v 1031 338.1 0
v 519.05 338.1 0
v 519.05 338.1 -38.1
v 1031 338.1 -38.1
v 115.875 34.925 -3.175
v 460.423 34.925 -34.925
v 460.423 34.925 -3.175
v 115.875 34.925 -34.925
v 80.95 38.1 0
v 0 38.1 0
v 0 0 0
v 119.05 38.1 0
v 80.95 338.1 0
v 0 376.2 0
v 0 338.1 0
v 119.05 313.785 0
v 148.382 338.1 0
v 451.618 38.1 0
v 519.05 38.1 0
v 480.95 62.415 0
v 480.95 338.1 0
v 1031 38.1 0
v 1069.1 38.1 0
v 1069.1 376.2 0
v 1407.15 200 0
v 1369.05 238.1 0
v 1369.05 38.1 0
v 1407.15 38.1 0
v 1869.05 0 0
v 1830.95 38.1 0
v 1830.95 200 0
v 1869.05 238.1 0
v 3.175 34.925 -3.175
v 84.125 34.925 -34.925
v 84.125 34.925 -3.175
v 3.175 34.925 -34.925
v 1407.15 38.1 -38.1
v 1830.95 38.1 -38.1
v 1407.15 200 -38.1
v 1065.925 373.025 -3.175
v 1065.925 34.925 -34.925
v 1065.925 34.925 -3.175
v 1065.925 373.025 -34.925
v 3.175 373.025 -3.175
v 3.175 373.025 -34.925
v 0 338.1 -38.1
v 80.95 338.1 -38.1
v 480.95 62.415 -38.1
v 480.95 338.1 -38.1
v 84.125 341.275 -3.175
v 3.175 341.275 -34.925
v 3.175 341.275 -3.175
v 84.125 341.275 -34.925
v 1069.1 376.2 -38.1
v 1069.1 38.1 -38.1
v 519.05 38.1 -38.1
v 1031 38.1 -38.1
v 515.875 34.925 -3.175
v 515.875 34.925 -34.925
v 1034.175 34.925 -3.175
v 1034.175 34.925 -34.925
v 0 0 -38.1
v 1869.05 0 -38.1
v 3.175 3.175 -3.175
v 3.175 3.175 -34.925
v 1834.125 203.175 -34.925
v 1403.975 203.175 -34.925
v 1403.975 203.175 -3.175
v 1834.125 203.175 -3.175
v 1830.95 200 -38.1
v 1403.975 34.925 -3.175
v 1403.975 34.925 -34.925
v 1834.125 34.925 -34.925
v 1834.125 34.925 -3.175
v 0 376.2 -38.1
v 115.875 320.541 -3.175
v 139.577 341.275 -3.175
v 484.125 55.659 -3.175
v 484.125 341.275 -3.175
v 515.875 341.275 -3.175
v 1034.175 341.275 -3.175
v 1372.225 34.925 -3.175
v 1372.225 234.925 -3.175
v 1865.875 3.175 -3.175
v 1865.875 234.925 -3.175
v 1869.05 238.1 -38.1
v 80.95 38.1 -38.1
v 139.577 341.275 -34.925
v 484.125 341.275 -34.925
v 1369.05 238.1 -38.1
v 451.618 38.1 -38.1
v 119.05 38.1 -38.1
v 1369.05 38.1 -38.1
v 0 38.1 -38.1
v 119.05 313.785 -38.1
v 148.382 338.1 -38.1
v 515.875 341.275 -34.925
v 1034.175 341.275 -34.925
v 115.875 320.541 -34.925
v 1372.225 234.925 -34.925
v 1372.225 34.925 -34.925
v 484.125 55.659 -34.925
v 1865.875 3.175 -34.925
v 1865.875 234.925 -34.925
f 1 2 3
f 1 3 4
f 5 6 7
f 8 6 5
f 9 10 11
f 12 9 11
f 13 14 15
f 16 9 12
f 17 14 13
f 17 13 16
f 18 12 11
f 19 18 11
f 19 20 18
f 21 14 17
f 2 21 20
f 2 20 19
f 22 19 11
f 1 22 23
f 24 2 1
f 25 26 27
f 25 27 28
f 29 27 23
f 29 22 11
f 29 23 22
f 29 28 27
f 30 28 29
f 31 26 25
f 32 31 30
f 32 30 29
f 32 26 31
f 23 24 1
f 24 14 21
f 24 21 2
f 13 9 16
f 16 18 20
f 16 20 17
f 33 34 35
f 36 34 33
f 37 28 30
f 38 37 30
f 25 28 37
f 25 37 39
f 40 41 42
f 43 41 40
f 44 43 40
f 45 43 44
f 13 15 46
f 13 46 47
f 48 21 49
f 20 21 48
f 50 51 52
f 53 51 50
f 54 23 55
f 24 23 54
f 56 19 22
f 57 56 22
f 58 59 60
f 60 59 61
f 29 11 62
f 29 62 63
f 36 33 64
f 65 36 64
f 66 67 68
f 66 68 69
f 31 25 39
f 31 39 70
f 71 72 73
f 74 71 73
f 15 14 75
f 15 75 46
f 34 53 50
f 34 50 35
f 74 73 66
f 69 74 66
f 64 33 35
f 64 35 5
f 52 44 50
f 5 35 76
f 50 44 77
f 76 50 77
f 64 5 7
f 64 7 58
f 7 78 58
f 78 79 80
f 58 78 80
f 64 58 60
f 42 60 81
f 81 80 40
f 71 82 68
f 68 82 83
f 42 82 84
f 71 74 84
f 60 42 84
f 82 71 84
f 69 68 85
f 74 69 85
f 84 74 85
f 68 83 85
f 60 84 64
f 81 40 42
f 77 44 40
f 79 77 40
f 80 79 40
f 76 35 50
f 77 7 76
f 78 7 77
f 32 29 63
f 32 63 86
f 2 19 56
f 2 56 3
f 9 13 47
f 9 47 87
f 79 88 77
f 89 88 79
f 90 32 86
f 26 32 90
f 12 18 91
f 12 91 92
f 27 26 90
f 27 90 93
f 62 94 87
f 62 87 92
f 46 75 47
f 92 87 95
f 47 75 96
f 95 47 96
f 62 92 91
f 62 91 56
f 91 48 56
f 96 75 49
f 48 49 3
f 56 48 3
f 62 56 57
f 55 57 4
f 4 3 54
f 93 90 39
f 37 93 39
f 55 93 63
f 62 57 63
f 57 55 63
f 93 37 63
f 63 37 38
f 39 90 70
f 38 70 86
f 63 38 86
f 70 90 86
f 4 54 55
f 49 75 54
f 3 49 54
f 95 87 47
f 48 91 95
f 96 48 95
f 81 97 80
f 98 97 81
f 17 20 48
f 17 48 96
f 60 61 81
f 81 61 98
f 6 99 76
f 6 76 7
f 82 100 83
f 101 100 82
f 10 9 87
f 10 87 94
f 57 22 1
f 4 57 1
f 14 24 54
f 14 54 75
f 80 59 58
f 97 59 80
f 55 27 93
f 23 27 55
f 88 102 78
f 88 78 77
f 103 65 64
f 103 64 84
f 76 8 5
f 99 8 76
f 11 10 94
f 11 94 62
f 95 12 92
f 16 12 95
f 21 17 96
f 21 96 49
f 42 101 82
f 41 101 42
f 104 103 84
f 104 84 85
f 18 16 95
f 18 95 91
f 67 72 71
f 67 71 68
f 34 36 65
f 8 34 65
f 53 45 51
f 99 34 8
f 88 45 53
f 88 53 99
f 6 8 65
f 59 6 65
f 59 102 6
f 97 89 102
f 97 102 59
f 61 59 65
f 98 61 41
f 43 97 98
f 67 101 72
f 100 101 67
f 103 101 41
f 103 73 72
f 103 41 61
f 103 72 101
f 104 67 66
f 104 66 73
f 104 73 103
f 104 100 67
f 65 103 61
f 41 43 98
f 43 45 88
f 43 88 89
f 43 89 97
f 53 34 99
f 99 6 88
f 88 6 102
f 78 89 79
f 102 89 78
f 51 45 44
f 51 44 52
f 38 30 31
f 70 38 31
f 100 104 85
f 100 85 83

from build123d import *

# Parameters (mm, degrees)
SKETCH1_W           = 511.95
SKETCH1_H           = 300
SKETCH1_W_2         = 423.8
SKETCH1_H_2         = 161.9
BOSS_EXTRUDE1_DEPTH = 38.1
SHELL1_START        = -34.925
SHELL1_OUTLINE_W    = 430.15
SHELL1_OUTLINE_H    = 168.25
SHELL1_OUTLINE_W_2  = 518.3
SHELL1_OUTLINE_H_2  = 306.35
SHELL1_DEPTH        = 31.75


# Read off the part's stored shape, not the designer's step: Shell1
with BuildPart() as part:
    # Sketch1 → Boss-Extrude1 (new body)
    with BuildSketch(Plane.XY):
        Polygon((0, 0), (1850, 0), (1869.05, 0), (1869.05, 38.1), (1869.05, 238.1), (1369.05, 238.1), (1369.05, 38.1), (1069.1, 38.1), (1069.1, 338.1), (1069.1, 376.2), (0, 376.2), (0, 338.1), (80.95, 338.1), (80.95, 38.1), (0, 38.1), align=None)
        with Locations((775.025, 188.1)):
            Rectangle(SKETCH1_W, SKETCH1_H, mode=Mode.SUBTRACT)
        Polygon((451.617753988, 38.1), (119.05, 38.1), (119.05, 313.784791922), align=None, mode=Mode.SUBTRACT)
        Polygon((148.382246012, 338.1), (480.95, 338.1), (480.95, 62.415208078), align=None, mode=Mode.SUBTRACT)
        with Locations((1619.05, 119.05)):
            Rectangle(SKETCH1_W_2, SKETCH1_H_2, mode=Mode.SUBTRACT)
    extrude(amount=-BOSS_EXTRUDE1_DEPTH)

    # Shell1 outline → Shell1 (cut)
    with BuildSketch(Plane.XY.offset(SHELL1_START)):
        Polygon((84.125, 34.925), (3.175, 34.925), (3.175, 3.175), (1865.875, 3.175), (1865.875, 234.925), (1372.225, 234.925), (1372.225, 34.925), (1065.925, 34.925), (1065.925, 373.025), (3.175, 373.025), (3.175, 341.275), (84.125, 341.275), align=None)
        Polygon((460.42283517, 34.925), (115.875, 34.925), (115.875, 320.540779362), align=None, mode=Mode.SUBTRACT)
        with Locations((1619.05, 119.05)):
            Rectangle(SHELL1_OUTLINE_W, SHELL1_OUTLINE_H, mode=Mode.SUBTRACT)
        Polygon((139.57716483, 341.275), (484.125, 341.275), (484.125, 55.659220638), align=None, mode=Mode.SUBTRACT)
        with Locations((775.025, 188.1)):
            Rectangle(SHELL1_OUTLINE_W_2, SHELL1_OUTLINE_H_2, mode=Mode.SUBTRACT)
    extrude(amount=SHELL1_DEPTH, mode=Mode.SUBTRACT)


solid = part.part
